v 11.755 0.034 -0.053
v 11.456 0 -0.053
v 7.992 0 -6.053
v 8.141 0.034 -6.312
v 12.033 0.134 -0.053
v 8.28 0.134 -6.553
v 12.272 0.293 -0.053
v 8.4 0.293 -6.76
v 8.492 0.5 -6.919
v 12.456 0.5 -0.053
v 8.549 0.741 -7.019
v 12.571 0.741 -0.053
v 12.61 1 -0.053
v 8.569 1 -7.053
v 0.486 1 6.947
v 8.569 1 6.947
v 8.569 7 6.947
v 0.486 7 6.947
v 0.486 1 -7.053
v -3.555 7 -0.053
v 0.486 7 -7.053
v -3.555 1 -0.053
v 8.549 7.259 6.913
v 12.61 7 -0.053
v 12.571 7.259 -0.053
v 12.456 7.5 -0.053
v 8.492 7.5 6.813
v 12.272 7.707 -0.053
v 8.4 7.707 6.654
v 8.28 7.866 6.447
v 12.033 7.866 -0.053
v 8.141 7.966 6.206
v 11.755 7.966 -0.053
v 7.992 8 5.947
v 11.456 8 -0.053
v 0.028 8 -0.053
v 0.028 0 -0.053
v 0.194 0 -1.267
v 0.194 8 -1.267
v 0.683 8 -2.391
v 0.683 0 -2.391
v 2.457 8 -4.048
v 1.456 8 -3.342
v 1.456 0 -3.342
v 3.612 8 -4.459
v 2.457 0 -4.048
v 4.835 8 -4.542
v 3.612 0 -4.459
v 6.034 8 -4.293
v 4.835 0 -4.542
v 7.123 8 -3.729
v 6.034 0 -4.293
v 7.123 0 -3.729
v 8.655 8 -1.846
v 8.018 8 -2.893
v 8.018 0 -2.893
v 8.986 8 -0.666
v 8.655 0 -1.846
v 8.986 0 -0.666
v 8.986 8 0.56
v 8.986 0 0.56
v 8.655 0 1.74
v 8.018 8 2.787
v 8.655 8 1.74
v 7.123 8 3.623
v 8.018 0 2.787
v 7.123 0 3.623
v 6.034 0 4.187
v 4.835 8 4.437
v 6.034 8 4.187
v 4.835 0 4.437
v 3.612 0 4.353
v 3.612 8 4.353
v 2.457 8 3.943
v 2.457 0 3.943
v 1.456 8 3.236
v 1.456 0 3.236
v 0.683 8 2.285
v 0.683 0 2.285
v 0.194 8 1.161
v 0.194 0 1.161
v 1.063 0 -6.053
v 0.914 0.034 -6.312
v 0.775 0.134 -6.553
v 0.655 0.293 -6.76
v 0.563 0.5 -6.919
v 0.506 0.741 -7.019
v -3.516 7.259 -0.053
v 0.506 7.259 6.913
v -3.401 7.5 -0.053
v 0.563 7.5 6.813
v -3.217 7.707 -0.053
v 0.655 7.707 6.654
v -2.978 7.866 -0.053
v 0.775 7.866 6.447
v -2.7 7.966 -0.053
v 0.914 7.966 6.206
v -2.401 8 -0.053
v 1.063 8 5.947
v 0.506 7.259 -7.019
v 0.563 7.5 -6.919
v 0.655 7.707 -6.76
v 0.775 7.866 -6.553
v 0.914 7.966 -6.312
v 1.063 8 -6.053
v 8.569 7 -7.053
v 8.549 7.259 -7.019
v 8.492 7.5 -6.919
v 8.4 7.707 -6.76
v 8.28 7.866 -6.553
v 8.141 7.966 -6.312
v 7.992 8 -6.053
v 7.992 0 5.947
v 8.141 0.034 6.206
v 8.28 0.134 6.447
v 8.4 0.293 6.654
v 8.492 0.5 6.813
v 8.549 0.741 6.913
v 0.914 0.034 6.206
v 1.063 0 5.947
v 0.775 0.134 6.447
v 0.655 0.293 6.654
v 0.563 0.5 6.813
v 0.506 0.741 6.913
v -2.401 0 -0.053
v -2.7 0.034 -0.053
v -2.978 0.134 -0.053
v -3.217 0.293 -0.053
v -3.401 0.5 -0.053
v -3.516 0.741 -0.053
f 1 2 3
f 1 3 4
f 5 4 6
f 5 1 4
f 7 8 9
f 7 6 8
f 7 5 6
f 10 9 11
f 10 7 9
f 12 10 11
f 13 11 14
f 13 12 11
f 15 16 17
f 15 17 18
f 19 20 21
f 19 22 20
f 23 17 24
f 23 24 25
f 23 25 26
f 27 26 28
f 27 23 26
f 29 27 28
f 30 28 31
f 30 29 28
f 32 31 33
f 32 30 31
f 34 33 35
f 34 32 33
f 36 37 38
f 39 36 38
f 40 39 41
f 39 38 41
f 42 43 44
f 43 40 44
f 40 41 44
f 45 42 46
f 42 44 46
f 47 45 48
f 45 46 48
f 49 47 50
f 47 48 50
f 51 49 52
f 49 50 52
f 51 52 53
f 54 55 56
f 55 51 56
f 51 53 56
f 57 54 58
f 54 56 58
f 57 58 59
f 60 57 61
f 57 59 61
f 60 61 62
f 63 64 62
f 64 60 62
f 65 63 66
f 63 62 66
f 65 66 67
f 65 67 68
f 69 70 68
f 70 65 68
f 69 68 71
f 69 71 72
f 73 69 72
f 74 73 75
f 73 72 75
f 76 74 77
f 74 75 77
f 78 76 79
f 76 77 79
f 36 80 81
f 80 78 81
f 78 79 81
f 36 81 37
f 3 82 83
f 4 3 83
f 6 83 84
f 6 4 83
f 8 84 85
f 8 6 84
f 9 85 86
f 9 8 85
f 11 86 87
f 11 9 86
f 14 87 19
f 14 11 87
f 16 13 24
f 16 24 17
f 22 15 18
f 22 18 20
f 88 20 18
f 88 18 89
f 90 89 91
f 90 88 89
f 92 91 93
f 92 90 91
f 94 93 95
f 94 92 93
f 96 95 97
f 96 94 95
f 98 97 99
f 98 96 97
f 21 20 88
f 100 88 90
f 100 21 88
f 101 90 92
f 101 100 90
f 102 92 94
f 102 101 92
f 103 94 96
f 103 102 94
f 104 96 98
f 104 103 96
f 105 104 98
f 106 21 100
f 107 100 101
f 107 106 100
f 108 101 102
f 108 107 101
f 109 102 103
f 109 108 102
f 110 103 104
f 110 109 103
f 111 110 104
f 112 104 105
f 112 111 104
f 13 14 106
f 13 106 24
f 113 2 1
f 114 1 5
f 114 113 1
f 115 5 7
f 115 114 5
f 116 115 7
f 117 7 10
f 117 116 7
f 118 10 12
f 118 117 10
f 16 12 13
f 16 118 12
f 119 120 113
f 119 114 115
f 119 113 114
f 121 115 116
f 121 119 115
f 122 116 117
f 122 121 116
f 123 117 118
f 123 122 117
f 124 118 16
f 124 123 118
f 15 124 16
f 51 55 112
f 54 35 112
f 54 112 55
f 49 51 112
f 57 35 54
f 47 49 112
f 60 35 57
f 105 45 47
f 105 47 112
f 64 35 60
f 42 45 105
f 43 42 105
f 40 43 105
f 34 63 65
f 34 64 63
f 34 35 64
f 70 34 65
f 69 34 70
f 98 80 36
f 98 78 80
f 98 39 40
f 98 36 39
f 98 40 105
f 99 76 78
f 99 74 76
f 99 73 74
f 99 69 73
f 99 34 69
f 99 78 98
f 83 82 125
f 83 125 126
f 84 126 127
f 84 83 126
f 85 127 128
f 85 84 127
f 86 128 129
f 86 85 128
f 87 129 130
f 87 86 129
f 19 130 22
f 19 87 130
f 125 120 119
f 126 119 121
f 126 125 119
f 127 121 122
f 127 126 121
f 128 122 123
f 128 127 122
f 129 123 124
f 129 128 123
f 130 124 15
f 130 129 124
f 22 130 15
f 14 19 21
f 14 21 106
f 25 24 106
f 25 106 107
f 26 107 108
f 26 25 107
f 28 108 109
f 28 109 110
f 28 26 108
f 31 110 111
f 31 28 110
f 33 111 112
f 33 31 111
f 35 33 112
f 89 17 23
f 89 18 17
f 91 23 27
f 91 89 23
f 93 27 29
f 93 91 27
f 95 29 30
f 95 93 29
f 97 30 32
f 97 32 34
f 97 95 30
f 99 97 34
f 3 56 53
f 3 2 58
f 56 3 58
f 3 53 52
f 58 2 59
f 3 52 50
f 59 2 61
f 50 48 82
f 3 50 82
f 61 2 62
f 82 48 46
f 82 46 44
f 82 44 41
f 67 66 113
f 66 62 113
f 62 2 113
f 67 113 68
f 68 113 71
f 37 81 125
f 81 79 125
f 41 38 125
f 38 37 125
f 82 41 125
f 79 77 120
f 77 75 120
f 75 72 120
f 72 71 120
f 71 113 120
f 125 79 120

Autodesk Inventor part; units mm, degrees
ref_plane "YZ Plane" through (0, 0, 0) normal (1, 0, 0) x (0, 1, 0)
ref_plane "XZ Plane" through (0, 0, 0) normal (0, 1, 0) x (-1, 0, 0)
ref_plane "XY Plane" through (0, 0, 0) normal (0, 0, 1) x (1, 0, 0)
sketch "Sketch1" plane through (0, 0, 0) normal (0, 1, 0) x (-1, 0, 0)
  line L0 (-0.4861, -7.0529) -> (-8.569, -7.0529)
  line L1 (-8.569, -7.0529) -> (-12.6104, -0.0529)
  line L2 (-12.6104, -0.0529) -> (-8.569, 6.9471)
  line L3 (-8.569, 6.9471) -> (-0.4861, 6.9471)
  line L4 (-0.4861, 6.9471) -> (3.5554, -0.0529)
  line L5 (3.5554, -0.0529) -> (-0.4861, -7.0529)
  circle A0 centre (-4.5275, -0.0529) radius 4.5
  dimension "d0" = 14
  dimension "d1" = 9
extrude "Extrusion1" add sketch "Sketch1" along normal blind 8
fillet "Fillet1" radius 1 12 edges at (4.5275, 8, 6.9471) (10.5897, 8, 3.4471) (10.5897, 8, -3.5529) (4.5275, 8, -7.0529) (-1.5346, 8, -3.5529) (-1.5346, 8, 3.4471) (4.5275, 0, 6.9471) (10.5897, 0, 3.4471) (10.5897, 0, -3.5529) (4.5275, 0, -7.0529) (-1.5346, 0, -3.5529) (-1.5346, 0, 3.4471)
properties part number "Tuerca"
